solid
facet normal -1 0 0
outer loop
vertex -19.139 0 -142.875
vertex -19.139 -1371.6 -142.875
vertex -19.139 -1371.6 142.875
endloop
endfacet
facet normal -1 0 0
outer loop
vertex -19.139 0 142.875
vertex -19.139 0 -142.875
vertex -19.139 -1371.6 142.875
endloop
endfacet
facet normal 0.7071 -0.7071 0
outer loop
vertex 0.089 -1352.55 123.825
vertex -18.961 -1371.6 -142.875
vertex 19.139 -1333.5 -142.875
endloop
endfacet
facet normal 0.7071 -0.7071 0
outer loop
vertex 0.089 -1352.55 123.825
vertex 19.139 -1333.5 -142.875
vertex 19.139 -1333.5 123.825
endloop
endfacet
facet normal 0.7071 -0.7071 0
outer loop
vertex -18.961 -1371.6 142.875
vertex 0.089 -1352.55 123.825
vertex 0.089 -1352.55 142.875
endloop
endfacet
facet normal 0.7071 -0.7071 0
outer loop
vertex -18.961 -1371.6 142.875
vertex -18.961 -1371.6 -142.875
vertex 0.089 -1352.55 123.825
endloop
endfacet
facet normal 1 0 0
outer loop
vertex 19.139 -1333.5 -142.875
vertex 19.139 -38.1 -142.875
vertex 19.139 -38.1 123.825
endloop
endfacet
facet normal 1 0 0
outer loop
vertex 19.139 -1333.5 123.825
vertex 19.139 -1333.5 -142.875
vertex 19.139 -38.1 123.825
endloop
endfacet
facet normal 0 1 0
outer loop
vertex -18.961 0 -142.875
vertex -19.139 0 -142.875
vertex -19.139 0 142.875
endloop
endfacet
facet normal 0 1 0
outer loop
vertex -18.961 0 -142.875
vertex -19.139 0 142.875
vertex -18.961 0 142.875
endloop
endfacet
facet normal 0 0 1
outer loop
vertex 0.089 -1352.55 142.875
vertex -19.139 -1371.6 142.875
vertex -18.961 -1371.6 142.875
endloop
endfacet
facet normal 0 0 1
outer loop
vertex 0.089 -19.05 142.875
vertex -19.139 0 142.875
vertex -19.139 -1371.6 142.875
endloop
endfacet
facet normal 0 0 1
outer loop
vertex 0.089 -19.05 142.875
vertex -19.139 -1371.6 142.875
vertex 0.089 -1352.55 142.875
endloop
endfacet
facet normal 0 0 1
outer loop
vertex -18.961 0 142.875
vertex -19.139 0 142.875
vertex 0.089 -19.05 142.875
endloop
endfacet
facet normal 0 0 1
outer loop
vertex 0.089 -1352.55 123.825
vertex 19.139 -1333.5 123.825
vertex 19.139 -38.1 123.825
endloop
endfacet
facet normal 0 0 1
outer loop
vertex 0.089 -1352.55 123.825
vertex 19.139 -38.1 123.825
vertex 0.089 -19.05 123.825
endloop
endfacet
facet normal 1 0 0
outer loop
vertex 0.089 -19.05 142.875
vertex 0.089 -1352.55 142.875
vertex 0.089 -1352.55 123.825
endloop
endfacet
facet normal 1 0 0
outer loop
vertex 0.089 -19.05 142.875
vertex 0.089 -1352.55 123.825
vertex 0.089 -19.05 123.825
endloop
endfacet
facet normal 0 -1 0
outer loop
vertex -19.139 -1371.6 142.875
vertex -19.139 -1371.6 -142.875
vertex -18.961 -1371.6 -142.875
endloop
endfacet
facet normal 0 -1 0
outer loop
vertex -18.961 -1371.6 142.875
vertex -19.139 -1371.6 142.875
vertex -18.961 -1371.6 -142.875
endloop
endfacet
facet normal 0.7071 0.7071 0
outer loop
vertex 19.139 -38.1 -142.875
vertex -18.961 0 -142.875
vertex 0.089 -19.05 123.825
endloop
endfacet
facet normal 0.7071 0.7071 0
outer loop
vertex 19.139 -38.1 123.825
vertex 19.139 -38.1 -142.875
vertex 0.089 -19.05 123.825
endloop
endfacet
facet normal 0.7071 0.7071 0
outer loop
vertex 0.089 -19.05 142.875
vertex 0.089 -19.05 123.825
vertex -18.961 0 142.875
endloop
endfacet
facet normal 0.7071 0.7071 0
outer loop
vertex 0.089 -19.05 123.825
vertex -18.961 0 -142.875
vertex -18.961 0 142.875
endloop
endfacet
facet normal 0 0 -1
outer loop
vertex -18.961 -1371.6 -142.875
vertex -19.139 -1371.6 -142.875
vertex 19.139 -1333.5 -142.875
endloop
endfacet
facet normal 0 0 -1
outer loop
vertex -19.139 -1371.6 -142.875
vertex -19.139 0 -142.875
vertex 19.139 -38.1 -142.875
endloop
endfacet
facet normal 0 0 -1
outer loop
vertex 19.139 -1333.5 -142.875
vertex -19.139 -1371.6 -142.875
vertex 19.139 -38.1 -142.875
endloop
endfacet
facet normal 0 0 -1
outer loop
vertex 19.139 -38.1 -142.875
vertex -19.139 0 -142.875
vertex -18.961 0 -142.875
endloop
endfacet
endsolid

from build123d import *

# Parameters (mm, degrees)
F0_W     = 38.277834
F0_H     = 285.75
F1_DEPTH = 1371.6
F2_SIZE  = 38.1
F3_W     = 1333.5
F3_H     = 19.05
F4_DEPTH = 19.05


with BuildPart() as f1:
    # F0 (on Front) → F1 (new body)
    with BuildSketch(Plane.XZ):
        Rectangle(F0_W, F0_H)
    extrude(amount=F1_DEPTH)

    # F2
    f2_edges = [f1.edges().sort_by_distance(p)[0] for p in [
        (19.138917, -1371.6, 0),
        (19.138917, 0, 0),
    ]]
    chamfer(f2_edges, length=F2_SIZE)

    # F3 (on face) → F4 (cut)
    with BuildSketch(Plane.YZ.offset(19.138917)):
        with Locations((-685.8, 133.35)):
            Rectangle(F3_W, F3_H)
    extrude(amount=-F4_DEPTH, mode=Mode.SUBTRACT)


solid = f1.part
